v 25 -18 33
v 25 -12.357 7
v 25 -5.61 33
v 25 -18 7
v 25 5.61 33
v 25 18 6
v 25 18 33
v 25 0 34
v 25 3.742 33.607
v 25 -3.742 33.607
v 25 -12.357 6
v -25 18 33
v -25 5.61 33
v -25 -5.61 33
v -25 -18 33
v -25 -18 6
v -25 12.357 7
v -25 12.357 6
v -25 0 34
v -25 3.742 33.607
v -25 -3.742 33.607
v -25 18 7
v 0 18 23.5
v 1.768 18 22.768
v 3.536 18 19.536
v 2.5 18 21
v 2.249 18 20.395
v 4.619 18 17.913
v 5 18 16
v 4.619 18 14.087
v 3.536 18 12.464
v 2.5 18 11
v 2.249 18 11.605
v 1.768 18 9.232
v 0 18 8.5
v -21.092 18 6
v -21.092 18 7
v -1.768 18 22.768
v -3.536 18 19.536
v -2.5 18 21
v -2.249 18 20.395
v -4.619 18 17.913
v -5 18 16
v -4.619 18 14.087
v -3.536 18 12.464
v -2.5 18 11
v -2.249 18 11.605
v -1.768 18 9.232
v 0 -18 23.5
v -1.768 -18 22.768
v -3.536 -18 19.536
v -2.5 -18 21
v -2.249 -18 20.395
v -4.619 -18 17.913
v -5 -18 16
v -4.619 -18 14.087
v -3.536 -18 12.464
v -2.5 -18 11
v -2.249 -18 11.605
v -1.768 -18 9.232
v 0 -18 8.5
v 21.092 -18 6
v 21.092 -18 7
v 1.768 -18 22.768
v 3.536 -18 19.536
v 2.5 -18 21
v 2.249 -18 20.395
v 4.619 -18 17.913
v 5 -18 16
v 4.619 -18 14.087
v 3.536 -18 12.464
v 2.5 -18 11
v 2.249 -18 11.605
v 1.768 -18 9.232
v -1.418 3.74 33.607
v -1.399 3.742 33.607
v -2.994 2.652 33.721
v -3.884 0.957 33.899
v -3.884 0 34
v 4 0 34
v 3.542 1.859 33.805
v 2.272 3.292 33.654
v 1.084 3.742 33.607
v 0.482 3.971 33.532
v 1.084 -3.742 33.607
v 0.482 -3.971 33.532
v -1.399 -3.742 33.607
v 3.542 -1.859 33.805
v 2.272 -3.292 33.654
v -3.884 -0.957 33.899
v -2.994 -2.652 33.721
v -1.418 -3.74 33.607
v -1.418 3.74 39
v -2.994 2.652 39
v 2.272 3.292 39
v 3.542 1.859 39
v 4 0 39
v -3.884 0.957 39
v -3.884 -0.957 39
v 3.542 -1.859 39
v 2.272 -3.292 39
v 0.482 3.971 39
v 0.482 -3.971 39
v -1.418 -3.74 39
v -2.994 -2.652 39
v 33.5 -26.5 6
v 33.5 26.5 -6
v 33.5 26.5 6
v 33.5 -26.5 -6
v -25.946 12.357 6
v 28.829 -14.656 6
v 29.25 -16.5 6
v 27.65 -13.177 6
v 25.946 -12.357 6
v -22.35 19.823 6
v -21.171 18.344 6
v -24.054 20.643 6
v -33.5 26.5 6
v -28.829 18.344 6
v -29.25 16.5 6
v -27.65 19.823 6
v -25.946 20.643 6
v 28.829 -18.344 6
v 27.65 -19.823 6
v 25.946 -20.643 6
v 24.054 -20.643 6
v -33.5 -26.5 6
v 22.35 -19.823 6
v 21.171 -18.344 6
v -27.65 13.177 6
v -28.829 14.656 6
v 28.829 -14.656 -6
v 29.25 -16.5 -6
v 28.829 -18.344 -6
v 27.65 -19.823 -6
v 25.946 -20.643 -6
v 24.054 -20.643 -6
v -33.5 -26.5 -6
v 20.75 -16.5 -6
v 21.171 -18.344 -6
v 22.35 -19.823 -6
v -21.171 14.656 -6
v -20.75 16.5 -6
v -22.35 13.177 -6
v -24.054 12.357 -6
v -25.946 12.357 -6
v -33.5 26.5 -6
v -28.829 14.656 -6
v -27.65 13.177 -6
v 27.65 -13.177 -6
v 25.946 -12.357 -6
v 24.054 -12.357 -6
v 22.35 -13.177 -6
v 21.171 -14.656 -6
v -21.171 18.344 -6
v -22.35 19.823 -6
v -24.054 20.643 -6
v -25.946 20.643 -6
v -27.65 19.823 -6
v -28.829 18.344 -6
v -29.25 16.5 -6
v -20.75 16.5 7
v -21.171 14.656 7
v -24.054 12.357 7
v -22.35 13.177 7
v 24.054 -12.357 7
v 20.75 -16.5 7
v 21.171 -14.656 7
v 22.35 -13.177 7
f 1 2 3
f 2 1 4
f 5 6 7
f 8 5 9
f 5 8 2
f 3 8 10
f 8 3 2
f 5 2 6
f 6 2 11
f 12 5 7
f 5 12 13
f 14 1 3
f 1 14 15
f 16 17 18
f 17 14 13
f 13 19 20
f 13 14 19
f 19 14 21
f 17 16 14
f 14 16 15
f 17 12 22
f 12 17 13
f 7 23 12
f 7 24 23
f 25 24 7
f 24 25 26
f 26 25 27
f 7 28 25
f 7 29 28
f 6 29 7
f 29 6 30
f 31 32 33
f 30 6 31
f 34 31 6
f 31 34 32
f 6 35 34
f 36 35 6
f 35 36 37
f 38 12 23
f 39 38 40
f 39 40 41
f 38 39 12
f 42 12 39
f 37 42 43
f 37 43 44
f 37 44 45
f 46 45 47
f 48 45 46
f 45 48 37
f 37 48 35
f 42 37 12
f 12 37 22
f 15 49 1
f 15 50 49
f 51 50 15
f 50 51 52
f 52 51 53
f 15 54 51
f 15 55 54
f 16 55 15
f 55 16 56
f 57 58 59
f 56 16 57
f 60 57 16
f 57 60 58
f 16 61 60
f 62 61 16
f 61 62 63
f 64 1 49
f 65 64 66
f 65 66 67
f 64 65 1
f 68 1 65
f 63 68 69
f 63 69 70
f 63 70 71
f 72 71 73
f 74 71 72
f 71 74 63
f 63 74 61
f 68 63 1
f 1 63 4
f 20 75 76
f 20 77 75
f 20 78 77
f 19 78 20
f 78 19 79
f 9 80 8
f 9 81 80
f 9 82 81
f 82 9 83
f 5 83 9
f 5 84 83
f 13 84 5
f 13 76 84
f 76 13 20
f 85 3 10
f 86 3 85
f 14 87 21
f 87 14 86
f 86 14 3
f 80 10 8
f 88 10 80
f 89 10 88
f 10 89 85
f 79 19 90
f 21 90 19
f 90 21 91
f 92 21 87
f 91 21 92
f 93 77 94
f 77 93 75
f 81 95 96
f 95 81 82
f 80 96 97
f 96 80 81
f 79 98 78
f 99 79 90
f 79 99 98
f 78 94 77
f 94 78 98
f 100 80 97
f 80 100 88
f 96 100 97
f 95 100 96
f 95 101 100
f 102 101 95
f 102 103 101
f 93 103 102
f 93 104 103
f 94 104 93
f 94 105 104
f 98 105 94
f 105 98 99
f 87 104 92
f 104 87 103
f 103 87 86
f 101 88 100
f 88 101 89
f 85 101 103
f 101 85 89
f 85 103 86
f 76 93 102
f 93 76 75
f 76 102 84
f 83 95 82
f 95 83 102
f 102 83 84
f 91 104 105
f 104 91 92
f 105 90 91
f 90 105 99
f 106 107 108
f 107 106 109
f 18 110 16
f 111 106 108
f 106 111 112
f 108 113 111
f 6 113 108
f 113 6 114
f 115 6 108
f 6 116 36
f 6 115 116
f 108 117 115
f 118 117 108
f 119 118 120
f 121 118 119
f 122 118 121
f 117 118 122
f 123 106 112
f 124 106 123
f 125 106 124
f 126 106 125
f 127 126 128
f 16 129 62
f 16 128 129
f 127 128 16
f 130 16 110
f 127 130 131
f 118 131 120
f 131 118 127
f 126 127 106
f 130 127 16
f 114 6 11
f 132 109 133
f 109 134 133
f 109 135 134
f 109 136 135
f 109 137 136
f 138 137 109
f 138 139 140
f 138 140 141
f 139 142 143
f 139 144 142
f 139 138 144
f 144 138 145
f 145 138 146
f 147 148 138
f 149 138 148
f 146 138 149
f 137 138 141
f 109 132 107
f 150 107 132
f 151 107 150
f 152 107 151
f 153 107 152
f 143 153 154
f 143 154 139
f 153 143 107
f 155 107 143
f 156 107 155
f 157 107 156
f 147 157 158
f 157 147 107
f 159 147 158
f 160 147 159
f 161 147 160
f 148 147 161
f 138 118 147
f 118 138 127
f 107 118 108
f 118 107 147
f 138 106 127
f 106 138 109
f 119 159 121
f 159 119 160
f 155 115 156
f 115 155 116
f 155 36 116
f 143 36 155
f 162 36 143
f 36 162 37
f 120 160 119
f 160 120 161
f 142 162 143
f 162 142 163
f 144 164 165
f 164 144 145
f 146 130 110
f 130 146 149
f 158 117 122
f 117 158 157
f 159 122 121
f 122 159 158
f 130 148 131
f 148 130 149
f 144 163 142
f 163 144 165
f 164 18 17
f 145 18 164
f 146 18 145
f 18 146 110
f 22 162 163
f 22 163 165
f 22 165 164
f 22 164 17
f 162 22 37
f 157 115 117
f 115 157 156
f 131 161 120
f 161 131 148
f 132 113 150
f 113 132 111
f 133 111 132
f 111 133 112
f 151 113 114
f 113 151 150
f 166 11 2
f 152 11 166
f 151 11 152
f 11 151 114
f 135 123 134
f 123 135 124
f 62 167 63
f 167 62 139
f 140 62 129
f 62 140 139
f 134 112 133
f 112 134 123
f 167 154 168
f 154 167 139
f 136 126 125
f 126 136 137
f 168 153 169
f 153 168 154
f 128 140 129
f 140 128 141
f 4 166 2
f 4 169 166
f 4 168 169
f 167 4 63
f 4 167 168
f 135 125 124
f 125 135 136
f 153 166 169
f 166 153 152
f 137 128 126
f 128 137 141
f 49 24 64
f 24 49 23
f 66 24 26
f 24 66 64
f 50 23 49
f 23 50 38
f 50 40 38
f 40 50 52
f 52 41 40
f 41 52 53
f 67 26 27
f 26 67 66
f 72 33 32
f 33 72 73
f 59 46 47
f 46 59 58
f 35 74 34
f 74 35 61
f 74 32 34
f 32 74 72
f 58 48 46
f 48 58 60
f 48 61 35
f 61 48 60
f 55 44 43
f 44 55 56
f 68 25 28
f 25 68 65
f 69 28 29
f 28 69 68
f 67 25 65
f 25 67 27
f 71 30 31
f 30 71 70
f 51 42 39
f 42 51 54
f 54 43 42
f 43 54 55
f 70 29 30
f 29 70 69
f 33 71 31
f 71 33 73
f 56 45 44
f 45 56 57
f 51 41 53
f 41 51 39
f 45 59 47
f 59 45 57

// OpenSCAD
// Parameters
base_L = 67; //[33.5:134:0.5]
base_W = 53; //[26.5:106:0.5]
base_H = 12; //[6:24:0.5]
housing_L = 50; //[25:100:0.5]
housing_W = 36; //[18:72:0.5]
housing_H = 28; //[14:56:0.5]
bore_D = 10; //[5:20:0.1]
bore_axis_H = 22; //[11:44:0.5]
mount_hole_D = 8.5; //[4.25:17:0.1]
mount_hole_spacing_L = 50; //[25:100:0.5]
mount_hole_edge_margin_W = 10; //[5:20:0.5]
overlap = 1; //[0.5:2:0.1]
housing_top_r = 18; //[9:36:0.5]
grease_boss_D = 8; //[4:16:0.5]
grease_boss_H = 6; //[3:12:0.5]
set_screw_D = 5; //[2.5:10:0.1]
set_screw_spacing_Z = 10; //[5:20:0.5]
set_screw_axis_Y = 0; //[-10:10:0.5]
fillet_r = 2; //[0.5:6:0.5]

// Base block
module base_block() {
  color("Silver")
  translate([0, 0, 0])
    cube([base_L, base_W, base_H], center=true);
}

// Bearing housing block
module bearing_housing_block() {
  color("DimGray")
  translate([0, 0, base_H/2 + housing_H/2 - overlap])
    cube([housing_L, housing_W, housing_H], center=true);
}

// Housing top profile
module housing_top_profile() {
  color("DimGray")
  translate([0, 0, base_H/2 + housing_H - housing_top_r])
    rotate([0, 90, 0])
      cylinder(r=housing_top_r, h=housing_L, center=true);
}

// Grease nipple boss
module grease_nipple_boss() {
  color("DimGray")
  translate([0, 0, base_H/2 + housing_H + grease_boss_H/2 - overlap])
    cylinder(r=grease_boss_D/2, h=grease_boss_H, center=true);
}

// Shaft bore
module shaft_bore() {
  translate([0, 0, bore_axis_H - base_H/2])
    rotate([90, 0, 0])
      cylinder(r=bore_D/2, h=base_W + housing_W + 4*overlap, center=true);
}

// Mounting holes
module mounting_hole_1() {
  translate([-mount_hole_spacing_L/2, base_W/2 - mount_hole_edge_margin_W, 0])
    cylinder(r=mount_hole_D/2, h=base_H + 2*overlap, center=true);
}

module mounting_hole_2() {
  translate([mount_hole_spacing_L/2, -(base_W/2 - mount_hole_edge_margin_W), 0])
    cylinder(r=mount_hole_D/2, h=base_H + 2*overlap, center=true);
}

// Set screw holes
module set_screw_hole_1() {
  translate([0, set_screw_axis_Y, bore_axis_H - base_H/2 + set_screw_spacing_Z/2])
    rotate([90, 0, 0])
      cylinder(r=set_screw_D/2, h=housing_W + 2*overlap, center=true);
}

module set_screw_hole_2() {
  translate([0, set_screw_axis_Y, bore_axis_H - base_H/2 - set_screw_spacing_Z/2])
    rotate([90, 0, 0])
      cylinder(r=set_screw_D/2, h=housing_W + 2*overlap, center=true);
}

// Fillet kernel sphere
module fillets_kernel_sphere() {
  sphere(r=fillet_r);
}

// Bearing housing
module bearing_housing() {
  union() {
    bearing_housing_block();
    housing_top_profile();
    grease_nipple_boss();
  }
}

// Raw body union
module raw_body_union() {
  union() {
    base_block();
    bearing_housing();
  }
}

// Mounting holes 2x
module mounting_holes_2x() {
  union() {
    mounting_hole_1();
    mounting_hole_2();
  }
}

// Set screw holes 2x
module set_screw_holes_2x() {
  union() {
    set_screw_hole_1();
    set_screw_hole_2();
  }
}

// Body with holes
module body_with_holes() {
  difference() {
    raw_body_union();
    shaft_bore();
    mounting_holes_2x();
    set_screw_holes_2x();
  }
}

// Final output with fillets
module fillets_chamfers() {
  // Minkowski is avoided due to performance issues, so fillets are omitted
  body_with_holes();
}

// Render the final output
fillets_chamfers();
